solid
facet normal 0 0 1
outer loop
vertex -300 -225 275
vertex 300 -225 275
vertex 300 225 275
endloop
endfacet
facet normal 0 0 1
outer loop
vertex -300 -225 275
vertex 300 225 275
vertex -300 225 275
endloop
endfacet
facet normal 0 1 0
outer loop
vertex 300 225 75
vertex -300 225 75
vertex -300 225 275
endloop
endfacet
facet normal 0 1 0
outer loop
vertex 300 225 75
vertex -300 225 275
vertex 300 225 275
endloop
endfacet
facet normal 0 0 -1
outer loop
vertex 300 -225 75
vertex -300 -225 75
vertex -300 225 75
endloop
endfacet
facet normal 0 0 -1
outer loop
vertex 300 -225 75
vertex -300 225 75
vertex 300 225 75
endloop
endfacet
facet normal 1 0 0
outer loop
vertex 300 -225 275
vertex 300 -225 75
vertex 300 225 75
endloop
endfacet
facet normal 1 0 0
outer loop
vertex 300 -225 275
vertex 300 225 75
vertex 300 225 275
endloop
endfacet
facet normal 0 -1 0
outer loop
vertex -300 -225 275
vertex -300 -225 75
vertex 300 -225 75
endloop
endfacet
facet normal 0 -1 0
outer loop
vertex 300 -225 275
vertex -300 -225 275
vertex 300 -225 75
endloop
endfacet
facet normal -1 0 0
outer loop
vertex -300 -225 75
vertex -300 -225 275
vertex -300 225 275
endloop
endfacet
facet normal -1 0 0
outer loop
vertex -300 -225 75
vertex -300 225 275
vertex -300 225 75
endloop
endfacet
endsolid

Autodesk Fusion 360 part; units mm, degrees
sketch "Layout_Side" plane through (0, 0, 0) normal (0, 1, 0) x (1, 0, 0) in component "00_Layout"
  line L0 (0, 0) -> (0, -1676.4) construction
  line L1 (300, -275) -> (-300, -275) construction
  line L2 (-300, -275) -> (-300, -75) construction
  line L3 (-300, -75) -> (300, -75) construction
  line L4 (300, -75) -> (300, -275) construction
  line L5 (300, -275) -> (-300, -75) construction
  line L6 (-300, -275) -> (300, -75) construction
  line L7 (0, -1676.4) -> (600, -1676.4) construction
  line L8 (0, -175) -> (0, -75) construction
  dimension "d1" = 200
  dimension "d2" = 600
  dimension "d4" = 600
  dimension "d5" = 75
  dimension "d6" = 1676.4
sketch "Base_Profile" plane through (0, 0, 0) normal (0, 1, 0) x (1, 0, 0) in component "01_Base_Envelope"
  line L0 (300, -275) -> (-300, -275)
  line L1 (-300, -275) -> (-300, -75)
  line L2 (-300, -75) -> (300, -75)
  line L3 (300, -75) -> (300, -275)
extrude "Chassis_Width_450mm" add sketch "Base_Profile" along normal mid plane 450 in component "01_Base_Envelope"
component "00_Layout" placed x (1, 0, 0) y (0, 1, 0) z (0, 0, 1) at (0, 0, 0)
component "01_Base_Envelope" placed x (1, 0, 0) y (0, 1, 0) z (0, 0, 1) at (0, 0, 0)
